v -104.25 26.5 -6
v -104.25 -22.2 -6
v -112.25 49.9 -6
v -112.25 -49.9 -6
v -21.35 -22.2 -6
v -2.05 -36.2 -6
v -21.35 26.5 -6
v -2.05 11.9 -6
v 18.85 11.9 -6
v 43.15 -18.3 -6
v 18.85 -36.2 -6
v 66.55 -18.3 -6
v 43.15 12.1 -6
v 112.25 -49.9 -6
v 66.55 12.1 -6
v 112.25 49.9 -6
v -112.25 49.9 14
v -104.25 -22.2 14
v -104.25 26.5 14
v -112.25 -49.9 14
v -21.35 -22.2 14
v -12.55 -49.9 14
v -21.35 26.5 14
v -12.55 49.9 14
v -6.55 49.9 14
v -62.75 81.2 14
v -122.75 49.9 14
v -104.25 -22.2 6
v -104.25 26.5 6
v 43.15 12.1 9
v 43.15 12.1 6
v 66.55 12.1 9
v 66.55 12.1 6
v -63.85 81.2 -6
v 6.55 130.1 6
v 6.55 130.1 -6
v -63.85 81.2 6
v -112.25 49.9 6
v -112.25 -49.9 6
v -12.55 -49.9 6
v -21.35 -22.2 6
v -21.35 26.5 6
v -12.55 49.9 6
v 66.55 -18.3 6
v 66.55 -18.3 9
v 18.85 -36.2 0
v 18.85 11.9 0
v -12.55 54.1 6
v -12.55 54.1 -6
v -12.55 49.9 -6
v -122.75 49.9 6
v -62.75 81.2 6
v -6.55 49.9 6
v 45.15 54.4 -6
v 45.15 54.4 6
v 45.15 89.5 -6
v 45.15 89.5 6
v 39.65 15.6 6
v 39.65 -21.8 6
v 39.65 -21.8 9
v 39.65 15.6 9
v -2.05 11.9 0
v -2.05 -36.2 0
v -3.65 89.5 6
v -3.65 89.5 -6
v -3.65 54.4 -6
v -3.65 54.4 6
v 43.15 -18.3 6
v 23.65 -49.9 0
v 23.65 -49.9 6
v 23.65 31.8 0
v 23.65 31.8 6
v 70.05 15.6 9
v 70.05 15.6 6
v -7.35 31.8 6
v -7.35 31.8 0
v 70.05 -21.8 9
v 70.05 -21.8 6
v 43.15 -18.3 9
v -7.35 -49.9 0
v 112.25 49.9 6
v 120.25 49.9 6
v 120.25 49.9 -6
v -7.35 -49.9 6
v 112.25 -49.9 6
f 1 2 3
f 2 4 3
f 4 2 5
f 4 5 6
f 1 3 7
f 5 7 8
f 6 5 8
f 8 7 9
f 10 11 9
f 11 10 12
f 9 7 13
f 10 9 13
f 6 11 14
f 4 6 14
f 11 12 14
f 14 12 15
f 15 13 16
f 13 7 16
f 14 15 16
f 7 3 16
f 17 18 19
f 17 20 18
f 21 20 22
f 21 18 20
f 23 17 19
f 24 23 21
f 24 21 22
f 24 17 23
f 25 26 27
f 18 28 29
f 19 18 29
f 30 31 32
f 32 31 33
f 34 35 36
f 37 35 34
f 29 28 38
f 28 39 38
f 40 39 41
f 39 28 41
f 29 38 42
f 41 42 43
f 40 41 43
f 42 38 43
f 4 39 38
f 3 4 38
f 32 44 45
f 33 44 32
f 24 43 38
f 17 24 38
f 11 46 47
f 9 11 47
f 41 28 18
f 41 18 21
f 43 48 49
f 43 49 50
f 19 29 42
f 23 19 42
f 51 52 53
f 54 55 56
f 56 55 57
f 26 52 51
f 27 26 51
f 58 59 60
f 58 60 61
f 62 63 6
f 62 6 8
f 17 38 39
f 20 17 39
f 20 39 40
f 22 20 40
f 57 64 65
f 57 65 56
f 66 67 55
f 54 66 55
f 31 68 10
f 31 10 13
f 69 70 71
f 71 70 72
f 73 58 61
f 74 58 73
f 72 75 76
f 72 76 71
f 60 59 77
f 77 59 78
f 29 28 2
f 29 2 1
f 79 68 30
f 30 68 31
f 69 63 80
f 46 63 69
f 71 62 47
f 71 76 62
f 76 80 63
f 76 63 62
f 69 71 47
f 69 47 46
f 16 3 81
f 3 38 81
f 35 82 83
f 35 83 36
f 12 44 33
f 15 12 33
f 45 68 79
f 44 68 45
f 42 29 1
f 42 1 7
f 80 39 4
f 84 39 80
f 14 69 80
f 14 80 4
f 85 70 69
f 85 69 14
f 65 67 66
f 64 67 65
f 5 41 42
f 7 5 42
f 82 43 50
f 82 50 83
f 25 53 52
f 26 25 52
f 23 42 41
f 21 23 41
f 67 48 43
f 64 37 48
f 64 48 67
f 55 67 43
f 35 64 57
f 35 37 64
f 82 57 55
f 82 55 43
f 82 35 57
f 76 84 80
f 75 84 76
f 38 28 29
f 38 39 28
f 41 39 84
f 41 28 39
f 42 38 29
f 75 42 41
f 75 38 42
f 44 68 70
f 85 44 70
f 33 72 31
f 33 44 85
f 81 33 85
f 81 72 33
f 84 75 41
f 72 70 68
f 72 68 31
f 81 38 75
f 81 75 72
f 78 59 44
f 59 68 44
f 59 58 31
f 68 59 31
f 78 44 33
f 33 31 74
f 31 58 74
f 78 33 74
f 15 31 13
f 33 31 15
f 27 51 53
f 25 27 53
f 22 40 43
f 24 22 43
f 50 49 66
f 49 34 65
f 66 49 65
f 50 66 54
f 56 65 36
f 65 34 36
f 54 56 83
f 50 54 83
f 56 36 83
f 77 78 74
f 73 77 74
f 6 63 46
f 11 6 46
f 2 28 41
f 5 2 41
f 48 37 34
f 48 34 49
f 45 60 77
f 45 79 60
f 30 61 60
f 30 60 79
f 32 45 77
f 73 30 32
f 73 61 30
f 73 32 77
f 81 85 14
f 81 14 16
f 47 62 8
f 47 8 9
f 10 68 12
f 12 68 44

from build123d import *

# Parameters (mm, degrees)
WALLSKETCH_W                                   = 224.5
WALLSKETCH_H                                   = 99.8
MAINWALL_DEPTH                                 = 6
WINDOWSKETCH_W                                 = 23.4
WINDOWSKETCH_H                                 = 30.4
WINDOWCUT_DEPTH                                = 12.2
PILOT001_ENTRANCERECESS_PROVISIONAL_START      = 6
PILOT001_ENTRANCERECESSSKETCH_W                = 31
PILOT001_ENTRANCERECESSSKETCH_H                = 81.7
PILOT001_ENTRANCERECESS_PROVISIONAL_DEPTH      = 6
PILOT001_DOOROPENINGSKETCH_W                   = 20.9
PILOT001_DOOROPENINGSKETCH_H                   = 48.1
PILOT001_DOOROPENING_PROVISIONAL_DEPTH         = 6.2
PILOT001_LARGEWINDOWOPENING_PROVISIONAL_START  = 6
PILOT001_LARGEWINDOWOPENINGSKETCH_W            = 82.9
PILOT001_LARGEWINDOWOPENINGSKETCH_H            = 48.7
PILOT001_LARGEWINDOWOPENING_PROVISIONAL_DEPTH  = 12.2
PILOT001_LEFTBAYBASE_PROVISIONAL_START         = 6
PILOT001_LEFTBAYBASESKETCH_W                   = 99.7
PILOT001_LEFTBAYBASESKETCH_H                   = 27.7
PILOT001_LEFTBAYBASE_PROVISIONAL_DEPTH         = 8
PILOT001_LEFTBAYUPPERSUPPORT_PROVISIONAL_START = 6
PILOT001_LEFTBAYUPPERSUPPORT_PROVISIONAL_DEPTH = 8
PILOT001_MAINGABLEPROFILE_PROVISIONAL_START    = 6
PILOT001_MAINGABLEPROFILE_PROVISIONAL_DEPTH    = 12
PILOT001_LEFTGABLEPROFILE_PROVISIONAL_START    = 6
PILOT001_LEFTGABLEPROFILE_PROVISIONAL_DEPTH    = 8
PILOT001_UPPERGABLEWINDOWOPENING_PROVISI_START = 6
PILOT001_UPPERGABLEWINDOWOPENINGSKETCH_W       = 48.8
PILOT001_UPPERGABLEWINDOWOPENINGSKETCH_H       = 35.1
PILOT001_UPPERGABLEWINDOWOPENING_PROVISI_DEPTH = 12.2
PILOT001_OPENINGSURROUND_PROVISIONAL_START     = 6
PILOT001_OPENINGSURROUNDSKETCH_W               = 30.4
PILOT001_OPENINGSURROUNDSKETCH_H               = 37.4
PILOT001_OPENINGSURROUNDSKETCH_W_2             = 23.4
PILOT001_OPENINGSURROUNDSKETCH_H_2             = 30.4
PILOT001_OPENINGSURROUND_PROVISIONAL_DEPTH     = 3


with BuildPart() as part:
    # WallSketch → MainWall (new, symmetric)
    with BuildSketch(Plane.XY):
        Rectangle(WALLSKETCH_W, WALLSKETCH_H)
    extrude(amount=MAINWALL_DEPTH, both=True)

    # WindowSketch → WindowCut (cut)
    with BuildSketch(Plane.XY.offset(6)):
        with Locations((54.85, -3.1)):
            Rectangle(WINDOWSKETCH_W, WINDOWSKETCH_H)
    extrude(amount=-WINDOWCUT_DEPTH, mode=Mode.SUBTRACT)

    # Pilot001_EntranceRecessSketch → Pilot001_EntranceRecess_PROVISIONAL (cut)
    with BuildSketch(Plane.XY.offset(PILOT001_ENTRANCERECESS_PROVISIONAL_START)):
        with Locations((8.15, -9.05)):
            Rectangle(PILOT001_ENTRANCERECESSSKETCH_W, PILOT001_ENTRANCERECESSSKETCH_H)
    extrude(amount=-PILOT001_ENTRANCERECESS_PROVISIONAL_DEPTH, mode=Mode.SUBTRACT)

    # Pilot001_DoorOpeningSketch → Pilot001_DoorOpening_PROVISIONAL (cut)
    with BuildSketch(Plane.XY):
        with Locations((8.4, -12.15)):
            Rectangle(PILOT001_DOOROPENINGSKETCH_W, PILOT001_DOOROPENINGSKETCH_H)
    extrude(amount=-PILOT001_DOOROPENING_PROVISIONAL_DEPTH, mode=Mode.SUBTRACT)

    # Pilot001_LargeWindowOpeningSketch → Pilot001_LargeWindowOpening_PROVISIONAL (cut)
    with BuildSketch(Plane.XY.offset(PILOT001_LARGEWINDOWOPENING_PROVISIONAL_START)):
        with Locations((-62.8, 2.15)):
            Rectangle(PILOT001_LARGEWINDOWOPENINGSKETCH_W, PILOT001_LARGEWINDOWOPENINGSKETCH_H)
    extrude(amount=-PILOT001_LARGEWINDOWOPENING_PROVISIONAL_DEPTH, mode=Mode.SUBTRACT)


with BuildPart() as body_2:
    # Pilot001_LeftBayBaseSketch → Pilot001_LeftBayBase_PROVISIONAL (new body)
    with BuildSketch(Plane.XY.offset(PILOT001_LEFTBAYBASE_PROVISIONAL_START)):
        with Locations((-62.4, -36.05)):
            Rectangle(PILOT001_LEFTBAYBASESKETCH_W, PILOT001_LEFTBAYBASESKETCH_H)
    extrude(amount=PILOT001_LEFTBAYBASE_PROVISIONAL_DEPTH)

    # Pilot001_LeftBayUpperSupportSketch → Pilot001_LeftBayUpperSupport_PROVISIONAL (add)
    with BuildSketch(Plane.XY.offset(PILOT001_LEFTBAYUPPERSUPPORT_PROVISIONAL_START)):
        Polygon((-112.25, -22.2), (-104.25, -22.2), (-104.25, 26.5), (-21.35, 26.5), (-21.35, -22.2), (-12.55, -22.2), (-12.55, 49.9), (-112.25, 49.9), align=None)
    extrude(amount=PILOT001_LEFTBAYUPPERSUPPORT_PROVISIONAL_DEPTH)


with BuildPart() as body_3:
    # Pilot001_MainGableProfileSketch → Pilot001_MainGableProfile_PROVISIONAL (new body)
    with BuildSketch(Plane.XY.offset(PILOT001_MAINGABLEPROFILE_PROVISIONAL_START)):
        Polygon((-12.55, 49.9), (120.25, 49.9), (6.55, 130.1), (-63.85, 81.2), (-12.55, 54.1), align=None)
    extrude(amount=-PILOT001_MAINGABLEPROFILE_PROVISIONAL_DEPTH)

    # Pilot001_UpperGableWindowOpeningSketch → Pilot001_UpperGableWindowOpening_PROVISIONAL (cut)
    with BuildSketch(Plane.XY.offset(PILOT001_UPPERGABLEWINDOWOPENING_PROVISI_START)):
        with Locations((20.75, 71.95)):
            Rectangle(PILOT001_UPPERGABLEWINDOWOPENINGSKETCH_W, PILOT001_UPPERGABLEWINDOWOPENINGSKETCH_H)
    extrude(amount=-PILOT001_UPPERGABLEWINDOWOPENING_PROVISI_DEPTH, mode=Mode.SUBTRACT)


with BuildPart() as body_4:
    # Pilot001_LeftGableProfileSketch → Pilot001_LeftGableProfile_PROVISIONAL (new body)
    with BuildSketch(Plane.XY.offset(PILOT001_LEFTGABLEPROFILE_PROVISIONAL_START)):
        Polygon((-122.75, 49.9), (-6.55, 49.9), (-62.75, 81.2), align=None)
    extrude(amount=PILOT001_LEFTGABLEPROFILE_PROVISIONAL_DEPTH)


with BuildPart() as body_5:
    # Pilot001_OpeningSurroundSketch → Pilot001_OpeningSurround_PROVISIONAL (new body)
    with BuildSketch(Plane.XY.offset(PILOT001_OPENINGSURROUND_PROVISIONAL_START)):
        with Locations((54.85, -3.1)):
            Rectangle(PILOT001_OPENINGSURROUNDSKETCH_W, PILOT001_OPENINGSURROUNDSKETCH_H)
        with Locations((54.85, -3.1)):
            Rectangle(PILOT001_OPENINGSURROUNDSKETCH_W_2, PILOT001_OPENINGSURROUNDSKETCH_H_2, mode=Mode.SUBTRACT)
    extrude(amount=PILOT001_OPENINGSURROUND_PROVISIONAL_DEPTH)


solid = Compound([part.part, body_2.part, body_3.part, body_4.part, body_5.part])
